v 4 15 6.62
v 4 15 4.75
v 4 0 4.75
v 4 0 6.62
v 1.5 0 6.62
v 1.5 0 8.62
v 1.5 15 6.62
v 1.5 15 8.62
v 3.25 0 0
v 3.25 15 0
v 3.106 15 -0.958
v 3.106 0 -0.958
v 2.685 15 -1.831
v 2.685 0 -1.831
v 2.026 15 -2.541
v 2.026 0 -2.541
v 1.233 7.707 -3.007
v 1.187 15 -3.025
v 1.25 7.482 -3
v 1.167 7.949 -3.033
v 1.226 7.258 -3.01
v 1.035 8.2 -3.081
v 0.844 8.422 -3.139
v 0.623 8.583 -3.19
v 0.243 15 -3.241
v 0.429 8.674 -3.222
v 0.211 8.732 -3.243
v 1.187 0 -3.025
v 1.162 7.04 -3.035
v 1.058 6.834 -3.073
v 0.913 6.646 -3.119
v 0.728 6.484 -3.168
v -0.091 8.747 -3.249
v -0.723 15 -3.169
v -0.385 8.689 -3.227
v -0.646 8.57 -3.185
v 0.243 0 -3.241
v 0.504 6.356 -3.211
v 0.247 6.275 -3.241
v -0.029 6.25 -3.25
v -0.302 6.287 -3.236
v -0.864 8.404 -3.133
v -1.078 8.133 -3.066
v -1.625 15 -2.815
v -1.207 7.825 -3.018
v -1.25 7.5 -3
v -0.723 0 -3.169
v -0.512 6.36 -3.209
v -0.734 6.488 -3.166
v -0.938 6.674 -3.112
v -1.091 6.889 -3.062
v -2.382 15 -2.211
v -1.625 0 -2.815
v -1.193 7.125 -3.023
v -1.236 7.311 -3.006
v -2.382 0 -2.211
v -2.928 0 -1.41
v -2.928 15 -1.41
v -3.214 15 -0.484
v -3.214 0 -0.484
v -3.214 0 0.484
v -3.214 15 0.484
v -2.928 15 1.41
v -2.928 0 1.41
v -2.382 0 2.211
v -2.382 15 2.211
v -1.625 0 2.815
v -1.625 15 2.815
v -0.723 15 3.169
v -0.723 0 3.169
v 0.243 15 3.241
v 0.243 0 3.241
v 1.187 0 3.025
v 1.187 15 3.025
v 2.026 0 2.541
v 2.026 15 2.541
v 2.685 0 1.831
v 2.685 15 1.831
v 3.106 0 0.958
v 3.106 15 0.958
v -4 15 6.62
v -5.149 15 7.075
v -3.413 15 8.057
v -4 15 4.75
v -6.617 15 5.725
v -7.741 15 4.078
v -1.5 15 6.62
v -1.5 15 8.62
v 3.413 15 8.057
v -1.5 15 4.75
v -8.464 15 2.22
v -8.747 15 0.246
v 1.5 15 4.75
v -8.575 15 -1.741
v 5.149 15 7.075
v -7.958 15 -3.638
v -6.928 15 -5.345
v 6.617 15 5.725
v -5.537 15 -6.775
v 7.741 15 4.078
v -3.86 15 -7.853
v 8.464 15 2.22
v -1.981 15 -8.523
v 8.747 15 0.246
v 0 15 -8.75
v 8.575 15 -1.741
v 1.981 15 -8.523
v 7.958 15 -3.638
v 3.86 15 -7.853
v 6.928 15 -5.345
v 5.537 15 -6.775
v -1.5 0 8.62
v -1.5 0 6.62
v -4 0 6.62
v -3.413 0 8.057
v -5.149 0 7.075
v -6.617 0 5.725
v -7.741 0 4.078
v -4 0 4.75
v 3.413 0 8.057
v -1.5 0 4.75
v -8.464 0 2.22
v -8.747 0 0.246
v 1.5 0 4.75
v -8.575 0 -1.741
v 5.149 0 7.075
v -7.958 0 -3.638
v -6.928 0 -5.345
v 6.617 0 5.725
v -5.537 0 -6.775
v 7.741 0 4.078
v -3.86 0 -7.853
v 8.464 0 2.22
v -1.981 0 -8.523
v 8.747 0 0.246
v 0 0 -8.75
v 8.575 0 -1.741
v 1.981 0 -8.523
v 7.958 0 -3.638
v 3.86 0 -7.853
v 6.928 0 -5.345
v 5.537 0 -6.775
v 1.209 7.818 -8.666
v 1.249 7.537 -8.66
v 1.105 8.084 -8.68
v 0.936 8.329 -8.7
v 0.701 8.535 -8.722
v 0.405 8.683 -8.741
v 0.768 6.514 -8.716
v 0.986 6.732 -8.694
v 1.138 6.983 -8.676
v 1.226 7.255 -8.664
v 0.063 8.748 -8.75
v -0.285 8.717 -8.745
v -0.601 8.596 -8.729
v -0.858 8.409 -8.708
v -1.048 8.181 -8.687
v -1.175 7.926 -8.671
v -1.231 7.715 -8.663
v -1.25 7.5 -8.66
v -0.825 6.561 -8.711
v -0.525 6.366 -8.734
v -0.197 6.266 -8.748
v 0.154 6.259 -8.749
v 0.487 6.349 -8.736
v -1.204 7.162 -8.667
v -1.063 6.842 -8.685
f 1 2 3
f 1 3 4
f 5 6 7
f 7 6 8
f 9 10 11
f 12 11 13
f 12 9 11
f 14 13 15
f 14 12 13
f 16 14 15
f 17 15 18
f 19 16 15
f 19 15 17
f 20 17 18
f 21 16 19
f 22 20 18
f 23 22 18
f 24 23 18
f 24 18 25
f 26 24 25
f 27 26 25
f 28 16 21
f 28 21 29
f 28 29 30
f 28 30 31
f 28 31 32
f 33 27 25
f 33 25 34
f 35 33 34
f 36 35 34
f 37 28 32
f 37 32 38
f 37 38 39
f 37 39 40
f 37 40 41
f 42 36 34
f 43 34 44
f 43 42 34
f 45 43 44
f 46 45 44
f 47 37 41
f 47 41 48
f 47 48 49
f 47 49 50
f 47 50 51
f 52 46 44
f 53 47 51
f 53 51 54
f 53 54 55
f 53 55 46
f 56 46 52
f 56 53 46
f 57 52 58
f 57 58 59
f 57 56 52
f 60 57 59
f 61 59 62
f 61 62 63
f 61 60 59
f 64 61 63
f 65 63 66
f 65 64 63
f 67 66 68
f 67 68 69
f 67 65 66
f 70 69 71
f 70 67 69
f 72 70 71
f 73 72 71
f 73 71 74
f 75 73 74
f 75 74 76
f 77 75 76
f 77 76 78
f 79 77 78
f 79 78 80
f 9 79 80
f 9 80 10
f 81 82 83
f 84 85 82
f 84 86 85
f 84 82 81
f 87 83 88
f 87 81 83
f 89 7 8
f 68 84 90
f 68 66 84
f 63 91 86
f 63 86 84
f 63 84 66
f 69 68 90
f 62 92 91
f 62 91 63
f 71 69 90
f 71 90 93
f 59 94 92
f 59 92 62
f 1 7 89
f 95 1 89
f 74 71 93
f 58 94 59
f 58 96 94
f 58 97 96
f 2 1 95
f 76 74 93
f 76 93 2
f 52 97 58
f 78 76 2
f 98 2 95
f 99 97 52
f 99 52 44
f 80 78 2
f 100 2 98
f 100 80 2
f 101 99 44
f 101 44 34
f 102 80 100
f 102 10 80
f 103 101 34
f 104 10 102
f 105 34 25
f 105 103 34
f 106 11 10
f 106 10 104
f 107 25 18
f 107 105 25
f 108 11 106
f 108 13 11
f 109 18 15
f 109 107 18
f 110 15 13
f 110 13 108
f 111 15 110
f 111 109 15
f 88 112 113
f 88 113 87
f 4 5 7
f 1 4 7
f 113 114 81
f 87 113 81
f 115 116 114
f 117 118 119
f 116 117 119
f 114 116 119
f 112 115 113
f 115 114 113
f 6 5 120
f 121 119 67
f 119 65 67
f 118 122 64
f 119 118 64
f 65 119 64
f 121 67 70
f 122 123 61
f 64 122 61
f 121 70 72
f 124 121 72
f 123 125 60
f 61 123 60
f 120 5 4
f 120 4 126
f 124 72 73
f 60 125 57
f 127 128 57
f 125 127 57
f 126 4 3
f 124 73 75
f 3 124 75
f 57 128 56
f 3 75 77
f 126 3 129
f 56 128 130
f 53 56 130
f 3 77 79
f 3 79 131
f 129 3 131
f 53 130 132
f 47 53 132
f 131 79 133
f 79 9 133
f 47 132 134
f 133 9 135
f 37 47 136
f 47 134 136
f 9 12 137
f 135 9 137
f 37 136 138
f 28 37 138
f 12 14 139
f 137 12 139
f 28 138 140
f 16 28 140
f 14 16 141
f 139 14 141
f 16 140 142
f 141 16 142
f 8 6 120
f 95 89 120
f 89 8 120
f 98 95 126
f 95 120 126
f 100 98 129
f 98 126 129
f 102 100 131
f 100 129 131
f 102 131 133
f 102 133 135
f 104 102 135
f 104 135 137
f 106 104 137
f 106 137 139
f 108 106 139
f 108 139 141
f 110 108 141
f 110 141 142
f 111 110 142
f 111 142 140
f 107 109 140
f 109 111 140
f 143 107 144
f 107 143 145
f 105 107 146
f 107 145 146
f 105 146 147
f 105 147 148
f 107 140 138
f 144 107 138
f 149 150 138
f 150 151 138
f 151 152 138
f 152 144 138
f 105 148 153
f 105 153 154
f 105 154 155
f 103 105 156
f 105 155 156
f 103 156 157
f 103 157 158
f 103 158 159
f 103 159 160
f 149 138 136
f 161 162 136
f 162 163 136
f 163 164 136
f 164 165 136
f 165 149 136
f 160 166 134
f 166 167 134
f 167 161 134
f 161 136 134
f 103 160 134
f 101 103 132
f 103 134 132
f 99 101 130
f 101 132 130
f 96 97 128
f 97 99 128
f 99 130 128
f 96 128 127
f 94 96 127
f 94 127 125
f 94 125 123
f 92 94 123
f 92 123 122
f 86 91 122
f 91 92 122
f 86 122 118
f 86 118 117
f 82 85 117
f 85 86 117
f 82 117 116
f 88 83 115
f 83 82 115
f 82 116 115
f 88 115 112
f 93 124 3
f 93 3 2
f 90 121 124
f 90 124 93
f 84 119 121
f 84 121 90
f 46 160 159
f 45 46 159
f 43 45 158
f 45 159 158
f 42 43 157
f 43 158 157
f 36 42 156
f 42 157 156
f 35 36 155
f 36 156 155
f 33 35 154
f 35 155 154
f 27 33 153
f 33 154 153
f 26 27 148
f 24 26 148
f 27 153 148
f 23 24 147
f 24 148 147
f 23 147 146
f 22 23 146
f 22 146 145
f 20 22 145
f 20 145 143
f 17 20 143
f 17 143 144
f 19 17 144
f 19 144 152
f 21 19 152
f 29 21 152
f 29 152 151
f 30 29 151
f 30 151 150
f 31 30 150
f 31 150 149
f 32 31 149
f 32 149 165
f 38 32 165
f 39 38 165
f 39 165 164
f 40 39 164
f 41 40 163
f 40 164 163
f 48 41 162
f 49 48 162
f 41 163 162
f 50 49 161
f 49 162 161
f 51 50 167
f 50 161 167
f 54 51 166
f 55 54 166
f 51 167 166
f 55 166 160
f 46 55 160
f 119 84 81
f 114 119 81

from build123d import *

# Parameters (mm, degrees)
SKETCH1_R           = 8.75
SKETCH1_R_2         = 3.25
BOSS_EXTRUDE1_DEPTH = 15
SKETCH2_W           = 3
SKETCH2_H           = 15
CUT_EXTRUDE2_DEPTH  = 4
SKETCH3_R           = 1.25
CUT_EXTRUDE3_DEPTH  = 8
SKETCH5_W           = 1.870469825
SKETCH5_H           = 15
CUT_EXTRUDE4_DEPTH  = 4


with BuildPart() as part:
    # Sketch1 → Boss-Extrude1 (new body)
    with BuildSketch(Plane(origin=(0, 0, 0), x_dir=(1, 0, 0), z_dir=(0, 1, 0))):
        Circle(SKETCH1_R)
        Circle(SKETCH1_R_2, mode=Mode.SUBTRACT)
    extrude(amount=BOSS_EXTRUDE1_DEPTH)

    # Sketch2 → Cut-Extrude2 (cut)
    with BuildSketch(Plane.XY.offset(8.75)):
        with Locations((0, 7.5)):
            Rectangle(SKETCH2_W, SKETCH2_H)
    extrude(amount=-CUT_EXTRUDE2_DEPTH, mode=Mode.SUBTRACT)

    # Sketch3 → Cut-Extrude3 (cut)
    with BuildSketch(Plane(origin=(0, 0, -8.75), x_dir=(-1, 0, 0), z_dir=(0, 0, -1))):
        with Locations((0, 7.5)):
            Circle(SKETCH3_R)
    extrude(amount=-CUT_EXTRUDE3_DEPTH, mode=Mode.SUBTRACT)

    # Sketch5 → Cut-Extrude4 (cut, symmetric)
    with BuildSketch(Plane.ZY):
        with Locations((5.685234913, 7.5)):
            Rectangle(SKETCH5_W, SKETCH5_H)
    extrude(amount=CUT_EXTRUDE4_DEPTH, both=True, mode=Mode.SUBTRACT)


solid = part.part
